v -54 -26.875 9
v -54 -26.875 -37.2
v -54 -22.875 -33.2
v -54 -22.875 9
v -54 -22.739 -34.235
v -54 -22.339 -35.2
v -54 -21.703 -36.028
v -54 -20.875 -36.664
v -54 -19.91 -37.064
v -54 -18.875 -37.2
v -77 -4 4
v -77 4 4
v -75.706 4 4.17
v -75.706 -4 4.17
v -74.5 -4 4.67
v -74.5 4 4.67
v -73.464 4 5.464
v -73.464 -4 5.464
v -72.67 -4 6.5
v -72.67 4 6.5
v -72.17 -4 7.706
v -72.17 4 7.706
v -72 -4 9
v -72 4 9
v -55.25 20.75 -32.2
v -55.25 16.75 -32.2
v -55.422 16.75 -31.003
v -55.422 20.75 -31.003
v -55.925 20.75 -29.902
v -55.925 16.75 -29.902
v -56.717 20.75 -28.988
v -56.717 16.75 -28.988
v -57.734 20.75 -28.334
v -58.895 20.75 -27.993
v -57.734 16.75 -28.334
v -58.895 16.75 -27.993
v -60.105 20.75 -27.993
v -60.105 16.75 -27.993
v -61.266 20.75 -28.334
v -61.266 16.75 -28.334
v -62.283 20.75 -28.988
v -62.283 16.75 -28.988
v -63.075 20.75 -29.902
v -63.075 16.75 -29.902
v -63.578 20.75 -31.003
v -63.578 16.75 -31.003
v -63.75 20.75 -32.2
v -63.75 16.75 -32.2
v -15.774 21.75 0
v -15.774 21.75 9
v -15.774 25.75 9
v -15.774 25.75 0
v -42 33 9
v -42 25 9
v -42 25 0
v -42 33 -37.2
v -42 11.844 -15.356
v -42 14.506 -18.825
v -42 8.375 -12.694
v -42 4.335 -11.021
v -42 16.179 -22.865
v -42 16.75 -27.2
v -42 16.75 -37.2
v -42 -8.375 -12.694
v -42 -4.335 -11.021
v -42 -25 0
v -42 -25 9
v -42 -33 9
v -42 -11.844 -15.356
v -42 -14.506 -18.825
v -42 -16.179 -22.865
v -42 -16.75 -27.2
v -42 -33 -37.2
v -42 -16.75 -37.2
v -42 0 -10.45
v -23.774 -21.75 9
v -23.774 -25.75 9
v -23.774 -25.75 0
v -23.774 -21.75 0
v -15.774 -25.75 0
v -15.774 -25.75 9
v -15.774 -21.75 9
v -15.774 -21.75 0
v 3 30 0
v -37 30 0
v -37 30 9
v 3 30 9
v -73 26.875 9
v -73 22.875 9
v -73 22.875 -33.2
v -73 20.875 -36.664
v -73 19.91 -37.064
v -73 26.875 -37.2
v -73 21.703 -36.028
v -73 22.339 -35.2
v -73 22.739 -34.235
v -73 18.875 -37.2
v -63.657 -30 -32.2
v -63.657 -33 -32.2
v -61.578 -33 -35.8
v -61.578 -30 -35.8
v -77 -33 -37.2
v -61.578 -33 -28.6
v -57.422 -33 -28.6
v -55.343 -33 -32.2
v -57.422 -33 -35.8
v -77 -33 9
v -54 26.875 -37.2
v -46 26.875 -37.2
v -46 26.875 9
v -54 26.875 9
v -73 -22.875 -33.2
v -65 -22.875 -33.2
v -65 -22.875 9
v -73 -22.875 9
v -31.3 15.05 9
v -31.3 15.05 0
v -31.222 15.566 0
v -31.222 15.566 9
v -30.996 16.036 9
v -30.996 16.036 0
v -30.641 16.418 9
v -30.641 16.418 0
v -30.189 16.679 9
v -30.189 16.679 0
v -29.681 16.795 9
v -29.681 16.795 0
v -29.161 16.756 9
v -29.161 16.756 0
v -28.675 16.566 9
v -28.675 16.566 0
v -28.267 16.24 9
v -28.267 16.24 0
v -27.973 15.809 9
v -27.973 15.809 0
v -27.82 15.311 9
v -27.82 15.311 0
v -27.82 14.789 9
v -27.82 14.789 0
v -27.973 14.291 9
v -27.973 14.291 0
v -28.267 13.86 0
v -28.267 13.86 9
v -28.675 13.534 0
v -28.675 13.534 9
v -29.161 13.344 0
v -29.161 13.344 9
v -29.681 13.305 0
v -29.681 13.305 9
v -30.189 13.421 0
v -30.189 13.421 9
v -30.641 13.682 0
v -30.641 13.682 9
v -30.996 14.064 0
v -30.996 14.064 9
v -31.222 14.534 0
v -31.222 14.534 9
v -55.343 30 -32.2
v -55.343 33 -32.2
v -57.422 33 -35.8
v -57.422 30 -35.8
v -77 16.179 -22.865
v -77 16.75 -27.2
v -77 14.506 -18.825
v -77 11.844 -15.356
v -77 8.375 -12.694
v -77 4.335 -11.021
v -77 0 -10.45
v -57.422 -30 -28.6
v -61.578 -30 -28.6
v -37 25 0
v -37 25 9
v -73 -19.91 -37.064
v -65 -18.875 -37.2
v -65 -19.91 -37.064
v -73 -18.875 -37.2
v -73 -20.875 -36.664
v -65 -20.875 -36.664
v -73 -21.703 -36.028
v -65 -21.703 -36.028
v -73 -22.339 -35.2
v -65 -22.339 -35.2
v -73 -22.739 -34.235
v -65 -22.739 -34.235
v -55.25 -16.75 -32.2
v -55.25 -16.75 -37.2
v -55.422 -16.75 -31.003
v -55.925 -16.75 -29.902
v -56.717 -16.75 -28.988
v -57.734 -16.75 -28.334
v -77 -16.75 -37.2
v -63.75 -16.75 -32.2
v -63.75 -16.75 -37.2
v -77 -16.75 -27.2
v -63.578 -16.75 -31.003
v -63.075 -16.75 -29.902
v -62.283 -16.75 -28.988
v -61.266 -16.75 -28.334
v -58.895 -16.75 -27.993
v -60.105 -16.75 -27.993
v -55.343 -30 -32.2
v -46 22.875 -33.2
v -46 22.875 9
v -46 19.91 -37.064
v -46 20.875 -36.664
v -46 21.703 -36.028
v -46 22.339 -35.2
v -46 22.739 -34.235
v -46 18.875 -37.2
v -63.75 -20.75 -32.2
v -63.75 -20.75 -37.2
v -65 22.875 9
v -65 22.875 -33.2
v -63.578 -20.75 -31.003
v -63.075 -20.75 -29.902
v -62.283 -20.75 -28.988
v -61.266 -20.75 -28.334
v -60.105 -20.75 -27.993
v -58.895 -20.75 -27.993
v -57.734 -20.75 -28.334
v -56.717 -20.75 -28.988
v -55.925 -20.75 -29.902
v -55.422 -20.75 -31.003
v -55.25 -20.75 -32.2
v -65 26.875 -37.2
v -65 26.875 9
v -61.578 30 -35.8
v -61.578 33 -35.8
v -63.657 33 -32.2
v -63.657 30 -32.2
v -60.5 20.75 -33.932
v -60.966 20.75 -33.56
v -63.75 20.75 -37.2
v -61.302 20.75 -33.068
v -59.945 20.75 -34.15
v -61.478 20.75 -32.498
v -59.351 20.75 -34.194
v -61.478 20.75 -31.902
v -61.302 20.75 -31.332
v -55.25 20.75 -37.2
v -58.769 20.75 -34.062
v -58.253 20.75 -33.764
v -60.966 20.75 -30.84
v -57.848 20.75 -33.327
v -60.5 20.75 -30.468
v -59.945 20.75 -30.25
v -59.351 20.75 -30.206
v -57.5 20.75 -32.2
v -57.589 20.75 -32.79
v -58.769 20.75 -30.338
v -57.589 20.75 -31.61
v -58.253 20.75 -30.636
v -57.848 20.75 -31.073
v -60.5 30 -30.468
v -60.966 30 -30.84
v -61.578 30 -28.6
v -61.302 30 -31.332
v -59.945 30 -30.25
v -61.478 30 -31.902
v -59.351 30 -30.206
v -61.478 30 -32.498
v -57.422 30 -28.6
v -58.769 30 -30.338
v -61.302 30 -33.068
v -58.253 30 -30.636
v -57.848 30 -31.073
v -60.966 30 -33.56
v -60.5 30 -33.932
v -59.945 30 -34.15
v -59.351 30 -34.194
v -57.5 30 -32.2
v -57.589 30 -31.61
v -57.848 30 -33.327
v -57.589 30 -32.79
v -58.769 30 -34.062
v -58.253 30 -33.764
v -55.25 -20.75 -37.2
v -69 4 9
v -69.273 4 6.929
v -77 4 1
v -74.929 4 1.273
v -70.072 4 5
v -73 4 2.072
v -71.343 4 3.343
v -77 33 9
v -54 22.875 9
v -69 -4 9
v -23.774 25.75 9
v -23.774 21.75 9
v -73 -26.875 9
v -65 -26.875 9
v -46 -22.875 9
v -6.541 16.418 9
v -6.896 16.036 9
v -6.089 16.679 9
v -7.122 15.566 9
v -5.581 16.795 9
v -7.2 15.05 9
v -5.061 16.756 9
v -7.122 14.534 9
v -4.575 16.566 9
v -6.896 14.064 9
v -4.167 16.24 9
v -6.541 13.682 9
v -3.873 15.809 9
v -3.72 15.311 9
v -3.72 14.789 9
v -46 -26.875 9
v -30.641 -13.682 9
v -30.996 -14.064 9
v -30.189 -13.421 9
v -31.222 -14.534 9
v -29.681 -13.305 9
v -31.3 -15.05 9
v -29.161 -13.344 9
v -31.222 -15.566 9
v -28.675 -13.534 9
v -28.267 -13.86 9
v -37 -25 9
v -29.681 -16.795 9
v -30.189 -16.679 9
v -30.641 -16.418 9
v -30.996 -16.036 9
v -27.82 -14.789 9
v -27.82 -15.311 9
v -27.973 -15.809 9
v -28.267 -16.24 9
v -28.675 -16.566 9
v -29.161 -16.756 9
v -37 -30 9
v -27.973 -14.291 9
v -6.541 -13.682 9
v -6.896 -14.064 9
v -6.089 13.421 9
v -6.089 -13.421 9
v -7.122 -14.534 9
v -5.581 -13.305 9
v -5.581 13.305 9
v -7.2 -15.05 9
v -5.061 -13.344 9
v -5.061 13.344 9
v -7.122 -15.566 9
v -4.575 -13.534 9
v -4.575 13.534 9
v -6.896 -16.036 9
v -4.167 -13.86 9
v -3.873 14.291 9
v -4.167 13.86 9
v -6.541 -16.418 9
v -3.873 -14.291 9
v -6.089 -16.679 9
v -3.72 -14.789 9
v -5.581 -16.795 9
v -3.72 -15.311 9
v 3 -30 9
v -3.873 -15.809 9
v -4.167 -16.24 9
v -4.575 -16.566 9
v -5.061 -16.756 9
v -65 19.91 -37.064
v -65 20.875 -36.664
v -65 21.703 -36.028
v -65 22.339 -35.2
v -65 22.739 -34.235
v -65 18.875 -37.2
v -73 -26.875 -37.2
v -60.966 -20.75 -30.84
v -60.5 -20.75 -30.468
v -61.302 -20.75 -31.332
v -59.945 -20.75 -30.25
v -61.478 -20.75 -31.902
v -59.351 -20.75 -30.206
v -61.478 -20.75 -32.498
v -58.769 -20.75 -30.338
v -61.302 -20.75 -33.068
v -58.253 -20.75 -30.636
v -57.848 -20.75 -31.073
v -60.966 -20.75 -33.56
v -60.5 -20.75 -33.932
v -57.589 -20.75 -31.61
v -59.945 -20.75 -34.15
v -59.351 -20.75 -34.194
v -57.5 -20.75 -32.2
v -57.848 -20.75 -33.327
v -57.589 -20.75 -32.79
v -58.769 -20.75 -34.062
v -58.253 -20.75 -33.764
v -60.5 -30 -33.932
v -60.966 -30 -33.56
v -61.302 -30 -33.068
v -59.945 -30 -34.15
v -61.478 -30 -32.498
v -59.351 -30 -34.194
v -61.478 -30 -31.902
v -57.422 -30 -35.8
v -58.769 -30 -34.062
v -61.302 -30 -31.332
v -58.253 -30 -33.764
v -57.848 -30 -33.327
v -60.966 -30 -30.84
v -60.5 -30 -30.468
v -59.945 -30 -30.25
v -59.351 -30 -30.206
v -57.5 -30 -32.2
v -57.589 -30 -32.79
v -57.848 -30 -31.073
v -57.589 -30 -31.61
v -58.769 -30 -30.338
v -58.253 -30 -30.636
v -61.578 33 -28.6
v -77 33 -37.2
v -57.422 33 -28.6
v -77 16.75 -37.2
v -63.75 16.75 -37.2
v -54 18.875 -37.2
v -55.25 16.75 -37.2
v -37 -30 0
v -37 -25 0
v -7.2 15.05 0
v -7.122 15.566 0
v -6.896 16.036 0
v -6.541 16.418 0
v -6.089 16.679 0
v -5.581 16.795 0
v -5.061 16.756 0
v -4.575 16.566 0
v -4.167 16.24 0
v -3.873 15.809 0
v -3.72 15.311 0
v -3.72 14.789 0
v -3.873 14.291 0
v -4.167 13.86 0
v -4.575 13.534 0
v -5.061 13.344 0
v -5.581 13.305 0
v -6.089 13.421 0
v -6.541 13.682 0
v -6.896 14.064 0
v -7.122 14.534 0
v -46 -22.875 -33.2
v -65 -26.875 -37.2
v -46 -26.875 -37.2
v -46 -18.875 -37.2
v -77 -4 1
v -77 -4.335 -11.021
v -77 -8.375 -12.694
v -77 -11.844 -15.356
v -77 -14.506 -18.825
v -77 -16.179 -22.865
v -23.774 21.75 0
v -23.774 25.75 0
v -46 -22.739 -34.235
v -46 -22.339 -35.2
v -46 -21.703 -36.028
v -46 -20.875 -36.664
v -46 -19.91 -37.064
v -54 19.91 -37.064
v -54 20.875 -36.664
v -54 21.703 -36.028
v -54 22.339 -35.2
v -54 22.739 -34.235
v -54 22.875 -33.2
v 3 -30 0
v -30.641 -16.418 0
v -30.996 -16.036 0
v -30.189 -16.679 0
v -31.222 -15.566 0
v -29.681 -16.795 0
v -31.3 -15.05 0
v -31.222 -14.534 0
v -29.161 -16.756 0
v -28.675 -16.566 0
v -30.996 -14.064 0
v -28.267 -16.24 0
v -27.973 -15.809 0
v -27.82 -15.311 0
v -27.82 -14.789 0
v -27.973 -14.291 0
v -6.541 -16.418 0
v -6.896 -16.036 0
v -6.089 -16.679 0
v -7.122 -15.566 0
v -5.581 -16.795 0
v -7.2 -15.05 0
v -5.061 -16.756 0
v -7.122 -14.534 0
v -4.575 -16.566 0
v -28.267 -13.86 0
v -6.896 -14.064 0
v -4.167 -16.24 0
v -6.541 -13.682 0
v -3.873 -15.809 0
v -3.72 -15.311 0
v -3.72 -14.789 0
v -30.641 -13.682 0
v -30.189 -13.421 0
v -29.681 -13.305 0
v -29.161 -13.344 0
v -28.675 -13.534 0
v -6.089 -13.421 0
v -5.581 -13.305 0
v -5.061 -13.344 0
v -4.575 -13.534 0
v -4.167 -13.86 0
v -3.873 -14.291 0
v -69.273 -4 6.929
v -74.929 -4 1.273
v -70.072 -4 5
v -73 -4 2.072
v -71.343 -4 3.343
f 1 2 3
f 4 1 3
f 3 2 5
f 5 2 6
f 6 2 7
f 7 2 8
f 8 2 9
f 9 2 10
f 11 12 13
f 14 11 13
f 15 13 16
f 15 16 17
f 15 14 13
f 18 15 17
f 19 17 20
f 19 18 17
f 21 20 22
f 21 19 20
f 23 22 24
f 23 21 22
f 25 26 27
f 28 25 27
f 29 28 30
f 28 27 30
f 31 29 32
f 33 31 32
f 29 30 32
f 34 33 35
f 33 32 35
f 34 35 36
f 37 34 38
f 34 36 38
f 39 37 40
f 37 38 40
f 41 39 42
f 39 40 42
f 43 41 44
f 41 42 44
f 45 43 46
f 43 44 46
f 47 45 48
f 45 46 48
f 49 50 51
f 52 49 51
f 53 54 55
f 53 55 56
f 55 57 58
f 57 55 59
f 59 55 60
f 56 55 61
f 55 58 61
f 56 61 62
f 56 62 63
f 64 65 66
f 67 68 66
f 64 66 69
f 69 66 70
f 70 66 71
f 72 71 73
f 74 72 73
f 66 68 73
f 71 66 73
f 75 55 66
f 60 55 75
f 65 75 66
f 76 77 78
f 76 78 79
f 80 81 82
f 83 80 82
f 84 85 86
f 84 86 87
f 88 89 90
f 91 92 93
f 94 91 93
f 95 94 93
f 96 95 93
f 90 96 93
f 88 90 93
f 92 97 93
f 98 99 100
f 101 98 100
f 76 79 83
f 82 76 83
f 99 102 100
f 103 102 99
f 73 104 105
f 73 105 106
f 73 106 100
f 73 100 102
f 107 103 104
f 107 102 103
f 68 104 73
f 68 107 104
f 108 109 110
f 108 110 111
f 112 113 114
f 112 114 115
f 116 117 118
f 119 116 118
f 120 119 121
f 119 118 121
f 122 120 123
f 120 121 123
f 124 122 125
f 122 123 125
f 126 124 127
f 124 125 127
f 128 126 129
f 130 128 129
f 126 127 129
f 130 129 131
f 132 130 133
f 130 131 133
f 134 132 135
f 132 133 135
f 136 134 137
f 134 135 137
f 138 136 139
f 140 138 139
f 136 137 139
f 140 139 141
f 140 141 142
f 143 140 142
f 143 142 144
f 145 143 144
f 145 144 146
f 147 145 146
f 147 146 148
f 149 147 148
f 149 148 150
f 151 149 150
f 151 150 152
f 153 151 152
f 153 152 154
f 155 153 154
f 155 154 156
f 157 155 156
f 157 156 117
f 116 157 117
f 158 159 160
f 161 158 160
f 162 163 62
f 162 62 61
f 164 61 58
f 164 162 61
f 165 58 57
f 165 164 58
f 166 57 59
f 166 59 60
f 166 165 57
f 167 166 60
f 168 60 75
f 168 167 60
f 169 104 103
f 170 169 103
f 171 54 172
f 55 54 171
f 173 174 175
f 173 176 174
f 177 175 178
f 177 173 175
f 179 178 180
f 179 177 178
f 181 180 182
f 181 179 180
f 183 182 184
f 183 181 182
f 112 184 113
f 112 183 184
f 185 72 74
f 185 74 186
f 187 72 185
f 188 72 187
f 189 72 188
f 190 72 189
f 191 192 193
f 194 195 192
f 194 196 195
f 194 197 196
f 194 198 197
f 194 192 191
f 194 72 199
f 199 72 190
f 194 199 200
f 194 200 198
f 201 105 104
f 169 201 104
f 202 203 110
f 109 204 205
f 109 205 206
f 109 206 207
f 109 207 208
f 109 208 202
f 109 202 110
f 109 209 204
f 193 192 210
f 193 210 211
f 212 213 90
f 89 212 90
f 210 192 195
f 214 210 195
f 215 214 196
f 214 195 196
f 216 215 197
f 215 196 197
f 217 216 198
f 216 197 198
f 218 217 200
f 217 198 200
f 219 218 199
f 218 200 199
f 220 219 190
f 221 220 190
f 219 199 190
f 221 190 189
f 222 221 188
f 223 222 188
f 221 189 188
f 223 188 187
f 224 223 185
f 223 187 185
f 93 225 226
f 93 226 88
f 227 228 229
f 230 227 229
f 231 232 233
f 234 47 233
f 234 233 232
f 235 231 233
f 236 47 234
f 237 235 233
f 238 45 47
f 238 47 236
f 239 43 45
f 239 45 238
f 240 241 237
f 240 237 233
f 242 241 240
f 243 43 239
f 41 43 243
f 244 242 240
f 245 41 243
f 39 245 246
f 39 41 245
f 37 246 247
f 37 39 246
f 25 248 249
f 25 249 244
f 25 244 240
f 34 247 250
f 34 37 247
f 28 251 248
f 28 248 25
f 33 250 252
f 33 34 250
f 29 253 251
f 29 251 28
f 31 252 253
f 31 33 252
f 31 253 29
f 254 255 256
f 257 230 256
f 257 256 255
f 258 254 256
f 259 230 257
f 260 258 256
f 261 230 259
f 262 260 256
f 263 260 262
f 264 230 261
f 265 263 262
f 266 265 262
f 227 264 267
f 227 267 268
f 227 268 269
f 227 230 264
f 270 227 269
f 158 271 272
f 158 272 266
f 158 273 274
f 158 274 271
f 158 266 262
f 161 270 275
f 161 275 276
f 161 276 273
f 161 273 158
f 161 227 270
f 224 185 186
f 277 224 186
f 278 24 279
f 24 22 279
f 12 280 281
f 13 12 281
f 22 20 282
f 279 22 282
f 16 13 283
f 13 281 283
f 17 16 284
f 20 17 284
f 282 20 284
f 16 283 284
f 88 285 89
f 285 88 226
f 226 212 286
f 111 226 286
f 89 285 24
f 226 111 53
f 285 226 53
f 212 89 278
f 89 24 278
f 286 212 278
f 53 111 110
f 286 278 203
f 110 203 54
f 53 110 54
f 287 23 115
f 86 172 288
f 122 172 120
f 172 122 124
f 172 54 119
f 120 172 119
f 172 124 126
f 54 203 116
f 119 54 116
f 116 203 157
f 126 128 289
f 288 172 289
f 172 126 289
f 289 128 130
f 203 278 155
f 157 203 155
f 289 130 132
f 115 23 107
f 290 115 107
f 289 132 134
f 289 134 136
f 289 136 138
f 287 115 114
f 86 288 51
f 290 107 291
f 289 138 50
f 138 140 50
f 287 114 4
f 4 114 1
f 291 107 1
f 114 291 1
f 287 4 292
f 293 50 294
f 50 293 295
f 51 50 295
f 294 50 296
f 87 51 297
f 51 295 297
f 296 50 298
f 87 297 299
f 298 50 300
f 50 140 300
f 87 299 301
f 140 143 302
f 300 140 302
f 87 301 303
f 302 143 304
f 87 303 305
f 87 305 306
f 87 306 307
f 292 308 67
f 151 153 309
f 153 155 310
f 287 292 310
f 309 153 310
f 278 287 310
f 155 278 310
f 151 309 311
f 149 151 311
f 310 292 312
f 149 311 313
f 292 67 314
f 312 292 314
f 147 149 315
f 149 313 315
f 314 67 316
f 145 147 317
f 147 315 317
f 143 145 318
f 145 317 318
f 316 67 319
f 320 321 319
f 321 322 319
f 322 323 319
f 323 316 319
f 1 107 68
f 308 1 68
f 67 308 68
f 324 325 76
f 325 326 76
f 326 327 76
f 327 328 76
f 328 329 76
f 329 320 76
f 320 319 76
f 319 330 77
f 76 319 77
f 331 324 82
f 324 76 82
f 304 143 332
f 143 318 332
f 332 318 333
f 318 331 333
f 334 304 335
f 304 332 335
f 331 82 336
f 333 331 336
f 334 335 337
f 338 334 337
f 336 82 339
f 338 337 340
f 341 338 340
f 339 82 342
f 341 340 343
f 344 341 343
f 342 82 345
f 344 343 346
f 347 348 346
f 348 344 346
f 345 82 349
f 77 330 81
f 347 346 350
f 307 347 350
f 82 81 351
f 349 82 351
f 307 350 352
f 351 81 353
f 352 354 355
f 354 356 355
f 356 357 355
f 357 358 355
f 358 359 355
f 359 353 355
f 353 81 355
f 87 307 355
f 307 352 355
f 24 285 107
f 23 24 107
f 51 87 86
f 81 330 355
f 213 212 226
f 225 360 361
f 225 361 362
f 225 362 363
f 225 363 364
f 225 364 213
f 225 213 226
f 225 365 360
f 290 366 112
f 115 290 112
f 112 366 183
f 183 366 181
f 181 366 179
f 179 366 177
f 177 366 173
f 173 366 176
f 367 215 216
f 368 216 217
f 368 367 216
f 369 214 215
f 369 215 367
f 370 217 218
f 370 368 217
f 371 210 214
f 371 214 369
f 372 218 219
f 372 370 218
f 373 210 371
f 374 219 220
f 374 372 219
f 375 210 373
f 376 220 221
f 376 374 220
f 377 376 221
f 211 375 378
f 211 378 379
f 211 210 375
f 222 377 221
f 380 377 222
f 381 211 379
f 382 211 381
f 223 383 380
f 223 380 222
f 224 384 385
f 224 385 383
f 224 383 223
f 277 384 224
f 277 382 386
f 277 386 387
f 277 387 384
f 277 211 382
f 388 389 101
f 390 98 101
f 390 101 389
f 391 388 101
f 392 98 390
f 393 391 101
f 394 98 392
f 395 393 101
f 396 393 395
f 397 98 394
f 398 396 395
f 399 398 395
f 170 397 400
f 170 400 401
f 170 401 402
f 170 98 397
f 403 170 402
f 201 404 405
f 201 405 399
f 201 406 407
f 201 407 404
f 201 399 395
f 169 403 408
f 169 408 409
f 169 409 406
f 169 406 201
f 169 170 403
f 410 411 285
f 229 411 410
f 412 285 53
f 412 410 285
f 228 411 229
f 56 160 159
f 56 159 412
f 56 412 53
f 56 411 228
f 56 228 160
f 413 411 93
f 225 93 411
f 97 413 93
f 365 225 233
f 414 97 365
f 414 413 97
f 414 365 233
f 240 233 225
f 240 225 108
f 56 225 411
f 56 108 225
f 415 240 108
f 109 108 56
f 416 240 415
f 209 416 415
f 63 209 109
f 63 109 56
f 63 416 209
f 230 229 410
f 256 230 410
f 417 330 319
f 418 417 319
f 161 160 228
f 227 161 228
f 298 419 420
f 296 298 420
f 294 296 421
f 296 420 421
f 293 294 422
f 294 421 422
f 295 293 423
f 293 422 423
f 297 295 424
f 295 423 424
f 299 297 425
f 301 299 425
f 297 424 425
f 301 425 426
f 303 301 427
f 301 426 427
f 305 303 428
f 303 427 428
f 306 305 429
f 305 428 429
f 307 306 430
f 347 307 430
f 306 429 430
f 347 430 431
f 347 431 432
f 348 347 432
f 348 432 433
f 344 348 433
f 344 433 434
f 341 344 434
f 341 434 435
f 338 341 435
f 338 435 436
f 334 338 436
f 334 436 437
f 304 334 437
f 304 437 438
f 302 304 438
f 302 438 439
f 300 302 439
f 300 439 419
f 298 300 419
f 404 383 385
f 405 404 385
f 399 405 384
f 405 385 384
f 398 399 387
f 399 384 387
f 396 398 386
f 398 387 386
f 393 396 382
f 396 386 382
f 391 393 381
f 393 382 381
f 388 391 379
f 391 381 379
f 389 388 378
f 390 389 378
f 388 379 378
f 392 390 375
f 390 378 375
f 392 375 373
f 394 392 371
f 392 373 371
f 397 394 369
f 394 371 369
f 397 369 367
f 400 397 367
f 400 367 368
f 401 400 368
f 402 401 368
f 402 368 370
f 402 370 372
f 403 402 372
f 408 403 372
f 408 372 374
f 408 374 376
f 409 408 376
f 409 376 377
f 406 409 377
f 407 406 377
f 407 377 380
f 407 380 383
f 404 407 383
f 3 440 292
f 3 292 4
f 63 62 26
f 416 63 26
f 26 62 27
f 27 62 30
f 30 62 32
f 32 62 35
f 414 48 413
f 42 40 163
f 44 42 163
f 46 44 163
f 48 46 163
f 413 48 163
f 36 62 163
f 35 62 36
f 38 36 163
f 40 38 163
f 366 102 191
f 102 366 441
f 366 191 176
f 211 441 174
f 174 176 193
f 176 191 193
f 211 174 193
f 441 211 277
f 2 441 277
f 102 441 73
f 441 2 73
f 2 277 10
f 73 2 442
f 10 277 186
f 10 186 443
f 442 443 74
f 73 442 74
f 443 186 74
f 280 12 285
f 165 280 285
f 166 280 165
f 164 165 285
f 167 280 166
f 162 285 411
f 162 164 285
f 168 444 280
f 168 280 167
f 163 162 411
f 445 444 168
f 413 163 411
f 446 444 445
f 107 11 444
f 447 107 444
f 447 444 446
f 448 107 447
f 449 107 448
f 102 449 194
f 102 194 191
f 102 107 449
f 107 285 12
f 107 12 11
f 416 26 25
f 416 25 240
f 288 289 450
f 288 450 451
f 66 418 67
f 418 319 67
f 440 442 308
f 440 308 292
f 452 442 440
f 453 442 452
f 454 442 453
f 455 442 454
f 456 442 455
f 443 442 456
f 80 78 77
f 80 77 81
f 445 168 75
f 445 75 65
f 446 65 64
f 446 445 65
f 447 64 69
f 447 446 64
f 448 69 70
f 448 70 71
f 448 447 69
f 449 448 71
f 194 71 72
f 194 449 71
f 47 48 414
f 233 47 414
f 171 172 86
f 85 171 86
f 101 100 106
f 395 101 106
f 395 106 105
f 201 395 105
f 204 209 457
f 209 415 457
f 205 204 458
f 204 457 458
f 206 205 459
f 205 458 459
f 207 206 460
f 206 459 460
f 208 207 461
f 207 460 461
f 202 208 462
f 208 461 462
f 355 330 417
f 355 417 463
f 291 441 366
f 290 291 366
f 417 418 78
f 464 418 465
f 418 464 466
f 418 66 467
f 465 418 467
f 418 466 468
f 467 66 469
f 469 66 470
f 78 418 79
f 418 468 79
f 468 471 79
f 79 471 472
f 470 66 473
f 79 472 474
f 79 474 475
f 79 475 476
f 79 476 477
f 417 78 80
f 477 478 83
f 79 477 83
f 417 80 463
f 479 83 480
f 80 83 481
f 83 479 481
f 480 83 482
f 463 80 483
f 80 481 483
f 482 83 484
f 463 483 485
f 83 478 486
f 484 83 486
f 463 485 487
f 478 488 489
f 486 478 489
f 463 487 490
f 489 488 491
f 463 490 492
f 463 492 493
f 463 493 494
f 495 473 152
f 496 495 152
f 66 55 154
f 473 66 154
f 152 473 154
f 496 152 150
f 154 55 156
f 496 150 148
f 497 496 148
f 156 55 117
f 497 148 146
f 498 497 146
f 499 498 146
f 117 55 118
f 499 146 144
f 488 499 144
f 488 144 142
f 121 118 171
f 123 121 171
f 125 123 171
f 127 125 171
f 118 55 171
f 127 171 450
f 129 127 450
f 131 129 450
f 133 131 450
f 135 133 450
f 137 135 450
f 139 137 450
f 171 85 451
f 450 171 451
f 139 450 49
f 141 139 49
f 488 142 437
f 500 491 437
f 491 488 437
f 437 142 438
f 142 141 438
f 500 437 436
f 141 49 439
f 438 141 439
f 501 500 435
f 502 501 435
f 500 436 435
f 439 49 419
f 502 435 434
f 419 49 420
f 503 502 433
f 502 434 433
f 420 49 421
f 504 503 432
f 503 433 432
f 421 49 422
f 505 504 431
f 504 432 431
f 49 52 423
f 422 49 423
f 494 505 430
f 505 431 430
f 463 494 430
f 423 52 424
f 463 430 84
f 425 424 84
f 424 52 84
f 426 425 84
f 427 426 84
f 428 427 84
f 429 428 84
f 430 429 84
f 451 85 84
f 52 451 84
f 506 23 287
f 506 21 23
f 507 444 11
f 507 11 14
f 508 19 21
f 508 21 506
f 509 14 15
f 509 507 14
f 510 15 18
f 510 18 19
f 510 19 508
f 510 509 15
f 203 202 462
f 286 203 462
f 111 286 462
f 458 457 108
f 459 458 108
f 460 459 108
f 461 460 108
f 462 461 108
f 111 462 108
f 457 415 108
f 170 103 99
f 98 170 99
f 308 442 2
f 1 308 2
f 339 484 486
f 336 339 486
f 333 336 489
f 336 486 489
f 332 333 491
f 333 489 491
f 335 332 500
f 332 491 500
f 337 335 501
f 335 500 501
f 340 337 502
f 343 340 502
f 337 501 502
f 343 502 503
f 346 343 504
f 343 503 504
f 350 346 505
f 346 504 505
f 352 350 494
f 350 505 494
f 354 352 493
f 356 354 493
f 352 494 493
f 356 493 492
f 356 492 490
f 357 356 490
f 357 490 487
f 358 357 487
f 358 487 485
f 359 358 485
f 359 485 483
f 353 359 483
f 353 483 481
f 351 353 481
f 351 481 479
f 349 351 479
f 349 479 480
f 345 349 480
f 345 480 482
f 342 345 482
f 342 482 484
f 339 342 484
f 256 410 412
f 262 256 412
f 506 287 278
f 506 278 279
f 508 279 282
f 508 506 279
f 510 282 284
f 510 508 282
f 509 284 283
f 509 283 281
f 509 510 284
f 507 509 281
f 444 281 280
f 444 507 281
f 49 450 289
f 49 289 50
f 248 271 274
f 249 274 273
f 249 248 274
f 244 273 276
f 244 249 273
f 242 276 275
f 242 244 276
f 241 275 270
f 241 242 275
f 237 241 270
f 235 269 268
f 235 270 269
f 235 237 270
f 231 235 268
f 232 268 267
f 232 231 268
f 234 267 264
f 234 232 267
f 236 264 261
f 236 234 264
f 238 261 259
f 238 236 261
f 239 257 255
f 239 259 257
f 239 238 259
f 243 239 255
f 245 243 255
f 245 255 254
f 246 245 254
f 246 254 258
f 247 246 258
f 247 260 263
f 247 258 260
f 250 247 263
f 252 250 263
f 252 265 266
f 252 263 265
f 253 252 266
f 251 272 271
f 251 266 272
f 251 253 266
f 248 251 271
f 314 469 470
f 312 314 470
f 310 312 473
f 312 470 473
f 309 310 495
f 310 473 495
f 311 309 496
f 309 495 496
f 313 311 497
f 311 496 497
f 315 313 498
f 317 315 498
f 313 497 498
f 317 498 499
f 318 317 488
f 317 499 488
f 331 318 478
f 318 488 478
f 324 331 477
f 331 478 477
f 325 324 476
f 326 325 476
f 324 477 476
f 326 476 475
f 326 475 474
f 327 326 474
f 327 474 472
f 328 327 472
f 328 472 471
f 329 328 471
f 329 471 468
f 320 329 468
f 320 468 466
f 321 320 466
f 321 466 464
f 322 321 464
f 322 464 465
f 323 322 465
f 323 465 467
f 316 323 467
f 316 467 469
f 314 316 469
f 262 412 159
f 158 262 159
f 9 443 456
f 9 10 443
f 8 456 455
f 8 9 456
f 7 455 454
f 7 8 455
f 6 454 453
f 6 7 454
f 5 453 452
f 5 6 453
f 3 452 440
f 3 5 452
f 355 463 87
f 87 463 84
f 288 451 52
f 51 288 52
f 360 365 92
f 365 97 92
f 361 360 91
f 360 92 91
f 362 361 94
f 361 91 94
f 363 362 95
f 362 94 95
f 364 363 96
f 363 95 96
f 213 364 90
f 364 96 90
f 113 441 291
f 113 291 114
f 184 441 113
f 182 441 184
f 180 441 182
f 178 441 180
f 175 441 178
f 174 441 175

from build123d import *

# Parameters (mm, degrees)
SKETCH1_W                       = 40
SKETCH1_H                       = 90
BOSS_EXTRUDE1_DEPTH             = 9
SKETCH2_W                       = 9
SKETCH2_H                       = 50
BOSS_EXTRUDE2_DEPTH             = 40
BOSS_EXTRUDE3_DEPTH             = 35
SKETCH4_W                       = 35
SKETCH4_H                       = 8.25
BOSS_EXTRUDE4_DEPTH             = 10
SKETCH5_W                       = 35
SKETCH5_H                       = 46.2
BOSS_EXTRUDE5_DEPTH             = 8
SKETCH6_W                       = 35
SKETCH6_H                       = 46.2
BOSS_EXTRUDE6_DEPTH             = 8
SKETCH10_R                      = 2
CUT_EXTRUDE1_DEPTH              = 62.75
CUT_EXTRUDE1_DEPTH_BACK         = 29.25
SKETCH11_R                      = 4.25
CUT_EXTRUDE2_DEPTH              = 4
SKETCH12_R                      = 4.25
CUT_EXTRUDE3_DEPTH              = 4
SKETCH13_W                      = 8
SKETCH13_H                      = 4
CUT_EXTRUDE4_DEPTH              = 47.2
FILLET1_R                       = 4
CUT_EXTRUDE5_DEPTH              = 3
CUT_EXTRUDE6_DEPTH              = 3
SKETCH18_R                      = 1.75
CUT_EXTRUDE7_DEPTH              = 10
SKETCH19_W                      = 40
SKETCH19_H                      = 9
CUT_EXTRUDE8_DEPTH              = 12
SKETCH20_W                      = 40
SKETCH20_H                      = 9
CUT_EXTRUDE9_DEPTH              = 12
CUT_EXTRUDE10_REACH             = 18.25
SKETCH21_W                      = 8.5
SKETCH21_H                      = 5
CUT_EXTRUDE10_DIRECTION_2_REACH = 51.75
SKETCH22_W                      = 8
SKETCH22_H                      = 4
CUT_EXTRUDE11_DEPTH             = 14
CUT_EXTRUDE12_DEPTH             = 4
CUT_EXTRUDE12_DEPTH_BACK        = 4
SKETCH25_W                      = 40
SKETCH25_H                      = 9
CUT_EXTRUDE13_DEPTH             = 3
SKETCH26_W                      = 40
SKETCH26_H                      = 9
CUT_EXTRUDE14_DEPTH             = 3


with BuildPart() as part:
    # Sketch1 → Boss-Extrude1 (new body)
    with BuildSketch(Plane.XY):
        with Locations((-17, 0)):
            Rectangle(SKETCH1_W, SKETCH1_H)
    extrude(amount=BOSS_EXTRUDE1_DEPTH)

    # Sketch2 → Boss-Extrude2 (add)
    with BuildSketch(Plane.ZY.offset(37)):
        with Locations((4.5, 0)):
            Rectangle(SKETCH2_W, SKETCH2_H)
    extrude(amount=BOSS_EXTRUDE2_DEPTH)

    # Sketch3 → Boss-Extrude3 (add)
    with BuildSketch(Plane.ZY.offset(77)):
        with BuildLine():
            Line((0, -25), (0, 25))
            Line((0, 25), (-27.2, 25))
            Line((-27.2, 25), (-27.2, 16.75))
            ThreePointArc((-27.2, 16.75), (-15.355961415, 11.844038585), (-10.45, 0))
            ThreePointArc((-10.45, 0), (-15.355961415, -11.844038585), (-27.2, -16.75))
            Line((-27.2, -16.75), (-27.2, -25))
            Line((-27.2, -25), (0, -25))
        make_face()
    extrude(amount=-BOSS_EXTRUDE3_DEPTH)

    # Sketch4 → Boss-Extrude4 (add)
    with BuildSketch(Plane(origin=(0, 0, -27.2), x_dir=(-1, 0, 0), z_dir=(0, 0, -1))):
        with Locations((59.5, -20.875)):
            Rectangle(SKETCH4_W, SKETCH4_H)
        with Locations((59.5, 20.875)):
            Rectangle(SKETCH4_W, SKETCH4_H)
    extrude(amount=BOSS_EXTRUDE4_DEPTH)

    # Sketch5 → Boss-Extrude5 (add)
    with BuildSketch(Plane.XZ.offset(25)):
        with Locations((-59.5, -14.1)):
            Rectangle(SKETCH5_W, SKETCH5_H)
    extrude(amount=BOSS_EXTRUDE5_DEPTH)

    # Sketch6 → Boss-Extrude6 (add)
    with BuildSketch(Plane(origin=(0, 25, 0), x_dir=(1, 0, 0), z_dir=(0, 1, 0))):
        with Locations((-59.5, 14.1)):
            Rectangle(SKETCH6_W, SKETCH6_H)
    extrude(amount=BOSS_EXTRUDE6_DEPTH)

    # Sketch10 → Cut-Extrude1 (cut, two sides)
    with BuildSketch(Plane(origin=(0, -16.75, 0), x_dir=(1, 0, 0), z_dir=(0, 1, 0))) as cut_extrude1_sk:
        with Locations((-59.5, 32.2)):
            Circle(SKETCH10_R)
    extrude(amount=CUT_EXTRUDE1_DEPTH, mode=Mode.SUBTRACT)
    extrude(cut_extrude1_sk.sketch, amount=-CUT_EXTRUDE1_DEPTH_BACK, mode=Mode.SUBTRACT)

    # Sketch11 → Cut-Extrude2 (cut)
    with BuildSketch(Plane(origin=(0, -16.75, 0), x_dir=(1, 0, 0), z_dir=(0, 1, 0))):
        with Locations((-59.5, 32.2)):
            Circle(SKETCH11_R)
    extrude(amount=-CUT_EXTRUDE2_DEPTH, mode=Mode.SUBTRACT)

    # Sketch12 → Cut-Extrude3 (cut)
    with BuildSketch(Plane.XZ.offset(-16.75)):
        with Locations((-59.5, -32.2)):
            Circle(SKETCH12_R)
    extrude(amount=-CUT_EXTRUDE3_DEPTH, mode=Mode.SUBTRACT)

    # Sketch13 → Cut-Extrude4 (cut, through all)
    with BuildSketch(Plane(origin=(0, 0, -37.2), x_dir=(-1, 0, 0), z_dir=(0, 0, -1))):
        with Locations((50, 24.875)):
            Rectangle(SKETCH13_W, SKETCH13_H)
        with Locations((69, 24.875)):
            Rectangle(SKETCH13_W, SKETCH13_H)
        with Locations((50, -24.875)):
            Rectangle(SKETCH13_W, SKETCH13_H)
        with Locations((69, -24.875)):
            Rectangle(SKETCH13_W, SKETCH13_H)
    extrude(amount=-CUT_EXTRUDE4_DEPTH, mode=Mode.SUBTRACT)

    # Fillet1
    fillet1_edges = [part.edges().sort_by_distance(p)[0] for p in [
        (-69, 22.875, -37.2),
        (-50, -22.875, -37.2),
        (-69, -22.875, -37.2),
        (-50, 22.875, -37.2),
    ]]
    fillet(fillet1_edges, radius=FILLET1_R)

    # Sketch16 → Cut-Extrude5 (cut)
    with BuildSketch(Plane.XZ.offset(33)):
        Polygon((-57.421539031, -28.6), (-61.578460969, -28.6), (-63.656921938, -32.2), (-61.578460969, -35.8), (-57.421539031, -35.8), (-55.343078062, -32.2), align=None)
    extrude(amount=-CUT_EXTRUDE5_DEPTH, mode=Mode.SUBTRACT)

    # Sketch17 → Cut-Extrude6 (cut)
    with BuildSketch(Plane(origin=(0, 33, 0), x_dir=(1, 0, 0), z_dir=(0, 1, 0))):
        Polygon((-61.578460969, 28.6), (-57.421539031, 28.6), (-55.343078062, 32.2), (-57.421539031, 35.8), (-61.578460969, 35.8), (-63.656921938, 32.2), align=None)
    extrude(amount=-CUT_EXTRUDE6_DEPTH, mode=Mode.SUBTRACT)

    # Sketch18 → Cut-Extrude7 (cut)
    with BuildSketch(Plane(origin=(0, 0, 0), x_dir=(-1, 0, 0), z_dir=(0, 0, -1))):
        with Locations((5.45, 15.05)):
            Circle(SKETCH18_R)
        with Locations((5.45, -15.05)):
            Circle(SKETCH18_R)
        with Locations((29.55, -15.05)):
            Circle(SKETCH18_R)
        with Locations((29.55, 15.05)):
            Circle(SKETCH18_R)
    extrude(amount=-CUT_EXTRUDE7_DEPTH, mode=Mode.SUBTRACT)

    # Sketch19 → Cut-Extrude8 (cut)
    with BuildSketch(Plane(origin=(0, 45, 0), x_dir=(1, 0, 0), z_dir=(0, 1, 0))):
        with Locations((-17, -4.5)):
            Rectangle(SKETCH19_W, SKETCH19_H)
    extrude(amount=-CUT_EXTRUDE8_DEPTH, mode=Mode.SUBTRACT)

    # Sketch20 → Cut-Extrude9 (cut)
    with BuildSketch(Plane.XZ.offset(45)):
        with Locations((-17, 4.5)):
            Rectangle(SKETCH20_W, SKETCH20_H)
    extrude(amount=-CUT_EXTRUDE9_DEPTH, mode=Mode.SUBTRACT)

    # Cut-Extrude10: up to this face of the body (flat: up to its plane)
    cut_extrude10_end = Plane(part.part.faces().sort_by_distance((-63.629791847, -20.75, -32.2))[0])
    # Sketch21 → Cut-Extrude10 (cut, up to the picked face)
    with BuildSketch(Plane(origin=(0, -16.75, 0), x_dir=(1, 0, 0), z_dir=(0, 1, 0)), mode=Mode.PRIVATE) as cut_extrude10_sk1:
        with Locations((-59.5, 34.7)):
            Rectangle(SKETCH21_W, SKETCH21_H)
    cut_extrude10_tool1 = split(extrude(cut_extrude10_sk1.sketch, amount=-CUT_EXTRUDE10_REACH, mode=Mode.PRIVATE), bisect_by=cut_extrude10_end, keep=Keep.BOTH, mode=Mode.PRIVATE)
    add(cut_extrude10_tool1.solids().sort_by_distance((-59.5, -16.75, -34.7))[0], mode=Mode.SUBTRACT)

    # Cut-Extrude10 direction 2: up to this face of the body (flat: up to its plane)
    cut_extrude10_direction_2_end = Plane(part.part.faces().sort_by_distance((-63.629791847, 20.75, -32.2))[0])
    # Sketch21 → Cut-Extrude10 direction 2 (cut, up to the picked face)
    with BuildSketch(Plane(origin=(0, -16.75, 0), x_dir=(1, 0, 0), z_dir=(0, 1, 0)), mode=Mode.PRIVATE) as cut_extrude10_direction_2_sk1:
        with Locations((-59.5, 34.7)):
            Rectangle(SKETCH21_W, SKETCH21_H)
    cut_extrude10_direction_2_tool1 = split(extrude(cut_extrude10_direction_2_sk1.sketch, amount=CUT_EXTRUDE10_DIRECTION_2_REACH, mode=Mode.PRIVATE), bisect_by=cut_extrude10_direction_2_end, keep=Keep.BOTH, mode=Mode.PRIVATE)
    add(cut_extrude10_direction_2_tool1.solids().sort_by_distance((-59.5, -16.75, -34.7))[0], mode=Mode.SUBTRACT)

    # Sketch22 → Cut-Extrude11 (cut)
    with BuildSketch(Plane.XY.offset(9)):
        with Locations((-19.773502692, -23.75)):
            Rectangle(SKETCH22_W, SKETCH22_H)
        with Locations((-19.773502692, 23.75)):
            Rectangle(SKETCH22_W, SKETCH22_H)
    extrude(amount=-CUT_EXTRUDE11_DEPTH, mode=Mode.SUBTRACT)

    # Sketch23 → Cut-Extrude12 (cut, two sides)
    with BuildSketch(Plane(origin=(0, 0, 0), x_dir=(1, 0, 0), z_dir=(0, 1, 0))) as cut_extrude12_sk:
        with BuildLine():
            ThreePointArc((-69, -9), (-71.343145751, -3.343145751), (-77, -1))
            Line((-77, -1), (-77, -4))
            ThreePointArc((-77, -4), (-73.464466094, -5.464466094), (-72, -9))
            Line((-72, -9), (-69, -9))
        make_face()
        with BuildLine():
            Line((-77, -4), (-77, -1))
            ThreePointArc((-77, -1), (-82.656854249, -14.656854249), (-69, -9))
            Line((-69, -9), (-72, -9))
            ThreePointArc((-72, -9), (-80.535533906, -12.535533906), (-77, -4))
        make_face()
    extrude(amount=CUT_EXTRUDE12_DEPTH, mode=Mode.SUBTRACT)
    extrude(cut_extrude12_sk.sketch, amount=-CUT_EXTRUDE12_DEPTH_BACK, mode=Mode.SUBTRACT)

    # Sketch25 → Cut-Extrude13 (cut)
    with BuildSketch(Plane(origin=(0, 33, 0), x_dir=(1, 0, 0), z_dir=(0, 1, 0))):
        with Locations((-17, -4.5)):
            Rectangle(SKETCH25_W, SKETCH25_H)
    extrude(amount=-CUT_EXTRUDE13_DEPTH, mode=Mode.SUBTRACT)

    # Sketch26 → Cut-Extrude14 (cut)
    with BuildSketch(Plane.XZ.offset(33)):
        with Locations((-17, 4.5)):
            Rectangle(SKETCH26_W, SKETCH26_H)
    extrude(amount=-CUT_EXTRUDE14_DEPTH, mode=Mode.SUBTRACT)


solid = part.part
